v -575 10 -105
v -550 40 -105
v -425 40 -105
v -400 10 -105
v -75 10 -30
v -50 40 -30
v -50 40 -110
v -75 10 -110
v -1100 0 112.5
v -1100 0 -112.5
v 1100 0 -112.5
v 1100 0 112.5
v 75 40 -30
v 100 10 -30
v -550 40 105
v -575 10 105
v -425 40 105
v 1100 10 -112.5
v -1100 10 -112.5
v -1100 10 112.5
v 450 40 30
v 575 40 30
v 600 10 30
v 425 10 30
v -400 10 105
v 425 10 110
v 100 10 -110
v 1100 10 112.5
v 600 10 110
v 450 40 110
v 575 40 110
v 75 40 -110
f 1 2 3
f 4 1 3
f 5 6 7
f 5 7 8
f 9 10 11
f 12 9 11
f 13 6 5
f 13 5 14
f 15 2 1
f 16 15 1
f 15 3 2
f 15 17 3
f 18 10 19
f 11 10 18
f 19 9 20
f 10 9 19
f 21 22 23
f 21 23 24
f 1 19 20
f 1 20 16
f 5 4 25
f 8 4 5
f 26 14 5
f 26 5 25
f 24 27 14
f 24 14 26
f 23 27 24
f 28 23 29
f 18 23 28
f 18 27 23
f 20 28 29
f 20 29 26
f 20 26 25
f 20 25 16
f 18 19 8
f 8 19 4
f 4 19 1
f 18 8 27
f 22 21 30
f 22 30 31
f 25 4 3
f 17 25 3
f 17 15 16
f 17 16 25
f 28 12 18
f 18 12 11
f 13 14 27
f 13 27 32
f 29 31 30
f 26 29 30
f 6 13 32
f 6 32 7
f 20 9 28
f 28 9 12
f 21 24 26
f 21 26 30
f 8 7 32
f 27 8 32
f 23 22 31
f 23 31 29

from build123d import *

# Parameters (mm, degrees)
SKETCH1_W           = 2200
SKETCH1_H           = 225
BOSS_EXTRUDE1_DEPTH = 10
BOSS_EXTRUDE2_START = 30
BOSS_EXTRUDE2_DEPTH = 80
BOSS_EXTRUDE3_START = -30
BOSS_EXTRUDE3_DEPTH = 80
BOSS_EXTRUDE4_DEPTH = 105


with BuildPart() as part:
    # Sketch1 → Boss-Extrude1 (new body)
    with BuildSketch(Plane(origin=(0, 0, 0), x_dir=(1, 0, 0), z_dir=(0, 1, 0))):
        Rectangle(SKETCH1_W, SKETCH1_H)
    extrude(amount=BOSS_EXTRUDE1_DEPTH)

    # Sketch2 → Boss-Extrude2 (add)
    with BuildSketch(Plane.XY.offset(BOSS_EXTRUDE2_START)):
        Polygon((425, 10), (450, 40), (575, 40), (600, 10), align=None)
    extrude(amount=BOSS_EXTRUDE2_DEPTH)

    # Sketch3 → Boss-Extrude3 (add)
    with BuildSketch(Plane.XY.offset(BOSS_EXTRUDE3_START)):
        Polygon((75, 40), (-50, 40), (-75, 10), (100, 10), align=None)
    extrude(amount=-BOSS_EXTRUDE3_DEPTH)

    # Sketch4 → Boss-Extrude4 (add, symmetric)
    with BuildSketch(Plane.XY):
        Polygon((-425, 40), (-550, 40), (-575, 10), (-400, 10), align=None)
    extrude(amount=BOSS_EXTRUDE4_DEPTH, both=True)


solid = part.part
